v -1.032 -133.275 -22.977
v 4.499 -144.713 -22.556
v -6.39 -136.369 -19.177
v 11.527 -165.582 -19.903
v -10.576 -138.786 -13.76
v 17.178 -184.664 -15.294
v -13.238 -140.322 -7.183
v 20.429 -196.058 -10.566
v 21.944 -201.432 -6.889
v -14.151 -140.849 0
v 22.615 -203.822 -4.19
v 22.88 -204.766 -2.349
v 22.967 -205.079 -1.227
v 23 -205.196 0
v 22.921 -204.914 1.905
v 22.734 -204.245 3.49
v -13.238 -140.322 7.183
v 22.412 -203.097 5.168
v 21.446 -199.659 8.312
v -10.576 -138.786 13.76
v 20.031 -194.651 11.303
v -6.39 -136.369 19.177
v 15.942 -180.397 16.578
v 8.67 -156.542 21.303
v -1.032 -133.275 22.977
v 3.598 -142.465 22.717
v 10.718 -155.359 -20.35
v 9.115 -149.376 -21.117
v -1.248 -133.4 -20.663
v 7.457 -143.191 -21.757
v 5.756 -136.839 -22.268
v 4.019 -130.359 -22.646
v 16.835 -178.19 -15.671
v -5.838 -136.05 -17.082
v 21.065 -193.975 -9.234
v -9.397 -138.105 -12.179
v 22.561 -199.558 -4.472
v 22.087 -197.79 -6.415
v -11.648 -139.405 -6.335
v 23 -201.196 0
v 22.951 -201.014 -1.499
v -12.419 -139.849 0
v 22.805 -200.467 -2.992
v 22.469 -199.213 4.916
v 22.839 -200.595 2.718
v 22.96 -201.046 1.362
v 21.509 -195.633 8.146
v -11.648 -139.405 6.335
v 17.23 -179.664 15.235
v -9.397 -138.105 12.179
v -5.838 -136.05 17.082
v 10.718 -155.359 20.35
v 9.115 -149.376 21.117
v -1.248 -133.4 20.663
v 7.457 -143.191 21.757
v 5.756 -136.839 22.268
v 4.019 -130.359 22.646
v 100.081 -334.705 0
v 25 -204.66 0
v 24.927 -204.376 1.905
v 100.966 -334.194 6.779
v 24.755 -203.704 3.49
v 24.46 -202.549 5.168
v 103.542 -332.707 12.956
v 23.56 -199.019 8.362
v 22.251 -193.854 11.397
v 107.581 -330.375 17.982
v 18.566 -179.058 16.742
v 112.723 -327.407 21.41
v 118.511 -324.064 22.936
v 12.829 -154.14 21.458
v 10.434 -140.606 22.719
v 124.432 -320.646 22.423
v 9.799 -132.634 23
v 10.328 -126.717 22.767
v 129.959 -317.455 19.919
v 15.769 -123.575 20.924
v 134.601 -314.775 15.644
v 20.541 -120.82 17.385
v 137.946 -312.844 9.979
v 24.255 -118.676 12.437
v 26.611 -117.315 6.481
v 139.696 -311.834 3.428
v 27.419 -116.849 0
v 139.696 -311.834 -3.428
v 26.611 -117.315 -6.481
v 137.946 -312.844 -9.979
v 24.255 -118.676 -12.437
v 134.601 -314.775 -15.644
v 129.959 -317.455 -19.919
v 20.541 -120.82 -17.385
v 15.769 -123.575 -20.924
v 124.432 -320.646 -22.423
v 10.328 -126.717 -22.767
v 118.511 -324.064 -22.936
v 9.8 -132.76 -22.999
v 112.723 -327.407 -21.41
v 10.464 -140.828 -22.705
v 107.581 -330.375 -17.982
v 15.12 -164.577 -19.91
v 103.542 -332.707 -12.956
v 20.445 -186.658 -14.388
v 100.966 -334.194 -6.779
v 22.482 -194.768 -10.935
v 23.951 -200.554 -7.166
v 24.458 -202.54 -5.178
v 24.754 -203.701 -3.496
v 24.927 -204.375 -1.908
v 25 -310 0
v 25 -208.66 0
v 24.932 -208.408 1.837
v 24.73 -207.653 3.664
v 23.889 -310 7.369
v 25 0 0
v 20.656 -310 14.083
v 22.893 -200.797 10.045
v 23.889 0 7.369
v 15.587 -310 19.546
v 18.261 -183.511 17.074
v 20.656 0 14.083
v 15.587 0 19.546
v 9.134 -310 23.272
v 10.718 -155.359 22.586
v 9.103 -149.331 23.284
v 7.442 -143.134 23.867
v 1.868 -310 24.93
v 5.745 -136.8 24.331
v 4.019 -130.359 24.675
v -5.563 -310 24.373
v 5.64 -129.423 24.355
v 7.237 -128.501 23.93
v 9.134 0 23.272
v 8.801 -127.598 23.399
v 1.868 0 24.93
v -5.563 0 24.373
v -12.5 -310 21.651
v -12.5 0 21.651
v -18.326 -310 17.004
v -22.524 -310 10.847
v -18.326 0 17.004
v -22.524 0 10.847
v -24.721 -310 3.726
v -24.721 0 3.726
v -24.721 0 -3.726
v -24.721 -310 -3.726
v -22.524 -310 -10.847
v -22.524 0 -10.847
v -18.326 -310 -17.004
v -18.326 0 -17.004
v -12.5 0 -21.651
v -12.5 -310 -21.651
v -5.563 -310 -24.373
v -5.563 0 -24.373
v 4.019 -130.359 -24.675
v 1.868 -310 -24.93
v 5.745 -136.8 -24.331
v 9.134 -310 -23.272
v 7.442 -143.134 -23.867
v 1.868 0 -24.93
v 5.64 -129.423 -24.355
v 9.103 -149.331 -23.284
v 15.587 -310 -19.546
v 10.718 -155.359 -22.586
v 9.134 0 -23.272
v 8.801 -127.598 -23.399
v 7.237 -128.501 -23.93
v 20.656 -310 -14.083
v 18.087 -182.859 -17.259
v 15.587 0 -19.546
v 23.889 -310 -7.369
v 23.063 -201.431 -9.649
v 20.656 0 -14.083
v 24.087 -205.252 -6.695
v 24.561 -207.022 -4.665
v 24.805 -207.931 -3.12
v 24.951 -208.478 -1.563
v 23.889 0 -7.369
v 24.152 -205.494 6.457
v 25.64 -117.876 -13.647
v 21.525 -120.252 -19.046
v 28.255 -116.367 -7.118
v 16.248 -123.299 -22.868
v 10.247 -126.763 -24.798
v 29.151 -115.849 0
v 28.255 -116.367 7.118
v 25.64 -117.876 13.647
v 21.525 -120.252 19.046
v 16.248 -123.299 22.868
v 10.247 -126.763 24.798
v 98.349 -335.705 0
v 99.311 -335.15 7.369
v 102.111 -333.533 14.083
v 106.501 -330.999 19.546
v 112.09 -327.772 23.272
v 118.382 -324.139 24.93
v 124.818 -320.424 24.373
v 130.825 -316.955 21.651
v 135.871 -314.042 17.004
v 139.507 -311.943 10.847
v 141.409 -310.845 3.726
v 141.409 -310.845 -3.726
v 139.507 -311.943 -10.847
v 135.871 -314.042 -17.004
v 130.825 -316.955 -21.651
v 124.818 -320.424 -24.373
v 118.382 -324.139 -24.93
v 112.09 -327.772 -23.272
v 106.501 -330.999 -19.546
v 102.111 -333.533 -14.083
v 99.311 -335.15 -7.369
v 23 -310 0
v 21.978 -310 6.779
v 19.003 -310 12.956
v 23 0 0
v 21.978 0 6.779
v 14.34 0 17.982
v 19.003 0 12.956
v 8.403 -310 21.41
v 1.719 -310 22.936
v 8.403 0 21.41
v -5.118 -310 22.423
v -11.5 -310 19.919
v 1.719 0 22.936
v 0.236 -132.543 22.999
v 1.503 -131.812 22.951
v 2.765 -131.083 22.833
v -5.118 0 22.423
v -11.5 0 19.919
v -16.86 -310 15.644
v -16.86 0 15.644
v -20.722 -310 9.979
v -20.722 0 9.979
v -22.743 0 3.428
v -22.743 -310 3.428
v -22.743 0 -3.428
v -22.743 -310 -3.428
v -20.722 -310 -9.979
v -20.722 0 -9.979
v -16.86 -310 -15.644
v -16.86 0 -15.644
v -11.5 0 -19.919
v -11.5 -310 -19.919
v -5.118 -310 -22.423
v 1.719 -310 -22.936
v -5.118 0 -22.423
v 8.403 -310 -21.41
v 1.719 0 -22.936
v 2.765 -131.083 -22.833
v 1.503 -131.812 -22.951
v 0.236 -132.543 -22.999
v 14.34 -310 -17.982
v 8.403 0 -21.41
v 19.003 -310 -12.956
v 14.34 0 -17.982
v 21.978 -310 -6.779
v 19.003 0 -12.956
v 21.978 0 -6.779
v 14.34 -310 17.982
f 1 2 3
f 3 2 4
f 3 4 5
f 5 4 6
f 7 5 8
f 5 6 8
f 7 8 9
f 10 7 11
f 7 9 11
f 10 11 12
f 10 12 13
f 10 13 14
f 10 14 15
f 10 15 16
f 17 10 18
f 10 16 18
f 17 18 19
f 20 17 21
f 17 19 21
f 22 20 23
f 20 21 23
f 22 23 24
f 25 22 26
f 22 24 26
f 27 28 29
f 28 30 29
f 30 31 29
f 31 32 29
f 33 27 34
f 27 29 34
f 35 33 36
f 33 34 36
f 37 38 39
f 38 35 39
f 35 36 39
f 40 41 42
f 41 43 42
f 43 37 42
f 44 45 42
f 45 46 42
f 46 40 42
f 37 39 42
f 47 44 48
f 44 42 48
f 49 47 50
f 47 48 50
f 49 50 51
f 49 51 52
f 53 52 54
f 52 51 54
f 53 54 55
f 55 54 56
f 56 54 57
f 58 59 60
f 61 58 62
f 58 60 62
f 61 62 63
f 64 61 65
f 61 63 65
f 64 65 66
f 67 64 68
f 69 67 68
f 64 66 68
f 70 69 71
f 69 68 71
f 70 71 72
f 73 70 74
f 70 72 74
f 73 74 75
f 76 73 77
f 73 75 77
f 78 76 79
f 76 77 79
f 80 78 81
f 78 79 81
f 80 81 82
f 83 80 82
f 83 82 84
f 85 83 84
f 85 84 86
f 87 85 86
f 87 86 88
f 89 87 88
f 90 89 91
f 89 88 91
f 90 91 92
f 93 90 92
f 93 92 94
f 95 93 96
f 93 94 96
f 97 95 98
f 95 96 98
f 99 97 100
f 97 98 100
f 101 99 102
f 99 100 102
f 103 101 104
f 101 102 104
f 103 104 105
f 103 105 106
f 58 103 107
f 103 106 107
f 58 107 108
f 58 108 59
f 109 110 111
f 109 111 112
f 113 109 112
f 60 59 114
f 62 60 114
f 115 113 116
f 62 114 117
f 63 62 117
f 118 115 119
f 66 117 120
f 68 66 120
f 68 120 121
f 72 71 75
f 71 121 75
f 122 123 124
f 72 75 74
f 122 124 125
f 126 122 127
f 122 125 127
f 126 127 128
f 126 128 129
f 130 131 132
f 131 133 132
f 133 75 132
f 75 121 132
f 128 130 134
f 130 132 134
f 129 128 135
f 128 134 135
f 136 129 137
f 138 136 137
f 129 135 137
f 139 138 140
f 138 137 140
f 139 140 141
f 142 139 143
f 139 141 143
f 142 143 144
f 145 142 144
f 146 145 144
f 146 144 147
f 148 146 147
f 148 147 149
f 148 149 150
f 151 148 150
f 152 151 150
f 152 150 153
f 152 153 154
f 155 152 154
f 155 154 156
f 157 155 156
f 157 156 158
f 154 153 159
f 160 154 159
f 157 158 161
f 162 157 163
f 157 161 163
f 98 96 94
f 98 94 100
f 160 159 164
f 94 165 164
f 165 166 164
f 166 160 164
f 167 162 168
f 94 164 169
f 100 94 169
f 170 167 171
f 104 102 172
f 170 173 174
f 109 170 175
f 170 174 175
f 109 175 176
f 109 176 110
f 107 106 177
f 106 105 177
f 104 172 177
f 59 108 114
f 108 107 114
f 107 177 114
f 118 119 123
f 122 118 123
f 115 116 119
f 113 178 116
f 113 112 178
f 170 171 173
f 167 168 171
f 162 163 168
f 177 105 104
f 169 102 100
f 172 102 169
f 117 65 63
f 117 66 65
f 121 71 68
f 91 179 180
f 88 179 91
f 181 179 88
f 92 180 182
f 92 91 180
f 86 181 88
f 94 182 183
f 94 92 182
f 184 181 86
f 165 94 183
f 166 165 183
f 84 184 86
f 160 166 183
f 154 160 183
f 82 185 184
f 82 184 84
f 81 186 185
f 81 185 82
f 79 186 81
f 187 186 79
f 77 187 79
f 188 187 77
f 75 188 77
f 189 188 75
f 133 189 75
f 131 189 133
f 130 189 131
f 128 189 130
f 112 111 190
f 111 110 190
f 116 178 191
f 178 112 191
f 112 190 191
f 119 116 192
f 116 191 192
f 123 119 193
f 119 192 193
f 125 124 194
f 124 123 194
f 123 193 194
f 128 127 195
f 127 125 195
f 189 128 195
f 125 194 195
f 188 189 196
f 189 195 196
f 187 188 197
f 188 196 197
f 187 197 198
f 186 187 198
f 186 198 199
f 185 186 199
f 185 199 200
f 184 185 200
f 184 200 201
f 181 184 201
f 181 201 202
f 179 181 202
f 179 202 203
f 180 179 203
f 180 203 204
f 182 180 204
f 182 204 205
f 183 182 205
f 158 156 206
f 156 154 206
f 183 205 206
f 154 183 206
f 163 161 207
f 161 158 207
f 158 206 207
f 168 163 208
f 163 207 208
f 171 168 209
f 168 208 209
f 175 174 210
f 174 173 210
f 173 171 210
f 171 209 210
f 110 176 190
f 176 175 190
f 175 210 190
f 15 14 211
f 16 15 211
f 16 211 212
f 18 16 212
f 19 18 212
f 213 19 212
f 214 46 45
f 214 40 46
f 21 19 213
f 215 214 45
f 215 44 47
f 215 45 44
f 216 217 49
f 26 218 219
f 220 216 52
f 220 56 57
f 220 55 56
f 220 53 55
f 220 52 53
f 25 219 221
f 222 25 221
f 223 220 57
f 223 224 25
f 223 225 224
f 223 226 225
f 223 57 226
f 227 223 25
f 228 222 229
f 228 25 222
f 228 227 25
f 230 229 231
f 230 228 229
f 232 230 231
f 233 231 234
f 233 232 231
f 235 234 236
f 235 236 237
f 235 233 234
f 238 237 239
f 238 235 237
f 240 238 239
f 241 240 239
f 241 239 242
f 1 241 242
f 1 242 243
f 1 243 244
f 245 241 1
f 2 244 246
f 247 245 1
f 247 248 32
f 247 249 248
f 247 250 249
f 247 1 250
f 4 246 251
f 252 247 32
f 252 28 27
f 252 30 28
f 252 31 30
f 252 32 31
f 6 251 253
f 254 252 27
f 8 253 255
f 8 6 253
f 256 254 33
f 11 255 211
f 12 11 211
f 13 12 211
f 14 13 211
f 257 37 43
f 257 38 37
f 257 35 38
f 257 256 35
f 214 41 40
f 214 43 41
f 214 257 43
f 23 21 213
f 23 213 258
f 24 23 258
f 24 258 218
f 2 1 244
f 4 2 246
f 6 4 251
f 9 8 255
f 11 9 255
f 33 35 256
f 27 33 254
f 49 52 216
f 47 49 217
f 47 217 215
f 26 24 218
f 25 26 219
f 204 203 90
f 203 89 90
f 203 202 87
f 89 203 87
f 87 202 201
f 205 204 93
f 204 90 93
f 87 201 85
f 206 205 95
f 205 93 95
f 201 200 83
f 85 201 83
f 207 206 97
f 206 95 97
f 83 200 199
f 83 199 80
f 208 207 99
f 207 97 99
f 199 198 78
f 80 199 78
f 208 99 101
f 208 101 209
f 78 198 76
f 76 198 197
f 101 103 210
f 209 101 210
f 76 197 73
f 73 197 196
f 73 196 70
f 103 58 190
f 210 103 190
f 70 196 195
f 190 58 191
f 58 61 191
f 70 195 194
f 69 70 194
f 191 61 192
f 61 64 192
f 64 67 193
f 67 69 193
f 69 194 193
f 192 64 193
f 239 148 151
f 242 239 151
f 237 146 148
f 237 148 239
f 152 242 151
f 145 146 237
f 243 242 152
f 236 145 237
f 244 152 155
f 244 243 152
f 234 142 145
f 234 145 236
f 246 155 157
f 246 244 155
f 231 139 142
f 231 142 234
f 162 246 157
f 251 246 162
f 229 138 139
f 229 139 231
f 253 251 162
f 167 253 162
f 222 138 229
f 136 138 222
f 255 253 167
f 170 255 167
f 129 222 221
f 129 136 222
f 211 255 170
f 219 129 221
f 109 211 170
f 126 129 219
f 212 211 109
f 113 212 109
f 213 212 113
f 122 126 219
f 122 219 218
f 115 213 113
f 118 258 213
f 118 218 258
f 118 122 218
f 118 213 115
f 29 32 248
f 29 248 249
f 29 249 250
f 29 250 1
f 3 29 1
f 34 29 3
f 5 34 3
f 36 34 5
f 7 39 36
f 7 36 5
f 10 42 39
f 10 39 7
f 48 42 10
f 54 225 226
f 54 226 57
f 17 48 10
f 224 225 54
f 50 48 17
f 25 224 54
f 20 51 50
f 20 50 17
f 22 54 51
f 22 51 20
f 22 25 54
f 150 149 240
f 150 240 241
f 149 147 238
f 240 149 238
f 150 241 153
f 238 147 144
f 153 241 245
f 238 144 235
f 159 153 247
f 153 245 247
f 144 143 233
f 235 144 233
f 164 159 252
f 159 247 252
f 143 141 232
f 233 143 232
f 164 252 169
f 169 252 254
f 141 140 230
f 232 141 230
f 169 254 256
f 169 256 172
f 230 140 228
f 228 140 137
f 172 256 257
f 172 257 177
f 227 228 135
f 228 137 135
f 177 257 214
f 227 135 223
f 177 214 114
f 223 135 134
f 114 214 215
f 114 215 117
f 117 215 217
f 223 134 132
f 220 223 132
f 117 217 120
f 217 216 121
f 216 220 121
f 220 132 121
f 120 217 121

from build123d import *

# Parameters (mm, degrees)
F0_R          = 25
F0_R_2        = 23
F1_DEPTH      = 310
F7_R          = 25
F7_R_2        = 23
F8_DEPTH      = 200
F8_DEPTH_BACK = 25


with BuildPart() as f1:
    # F0 (on Front) → F1 (new body)
    with BuildSketch(Plane.XZ):
        Circle(F0_R)
        Circle(F0_R_2, mode=Mode.SUBTRACT)
    extrude(amount=F1_DEPTH)

    # F7 (on line) → F8 (join, two sides)
    with BuildSketch(Plane(origin=(69.9519052838, -121.1602540378, 0), x_dir=(-0.8660254038, -0.5, 0), z_dir=(-0.5, 0.8660254038, 0))) as f8_sk:
        with Locations((57.6794919243, 0)):
            Circle(F7_R)
        with Locations((57.6794919243, 0)):
            Circle(F7_R_2, mode=Mode.SUBTRACT)
    extrude(amount=-F8_DEPTH)
    extrude(f8_sk.sketch, amount=F8_DEPTH_BACK)


solid = f1.part
